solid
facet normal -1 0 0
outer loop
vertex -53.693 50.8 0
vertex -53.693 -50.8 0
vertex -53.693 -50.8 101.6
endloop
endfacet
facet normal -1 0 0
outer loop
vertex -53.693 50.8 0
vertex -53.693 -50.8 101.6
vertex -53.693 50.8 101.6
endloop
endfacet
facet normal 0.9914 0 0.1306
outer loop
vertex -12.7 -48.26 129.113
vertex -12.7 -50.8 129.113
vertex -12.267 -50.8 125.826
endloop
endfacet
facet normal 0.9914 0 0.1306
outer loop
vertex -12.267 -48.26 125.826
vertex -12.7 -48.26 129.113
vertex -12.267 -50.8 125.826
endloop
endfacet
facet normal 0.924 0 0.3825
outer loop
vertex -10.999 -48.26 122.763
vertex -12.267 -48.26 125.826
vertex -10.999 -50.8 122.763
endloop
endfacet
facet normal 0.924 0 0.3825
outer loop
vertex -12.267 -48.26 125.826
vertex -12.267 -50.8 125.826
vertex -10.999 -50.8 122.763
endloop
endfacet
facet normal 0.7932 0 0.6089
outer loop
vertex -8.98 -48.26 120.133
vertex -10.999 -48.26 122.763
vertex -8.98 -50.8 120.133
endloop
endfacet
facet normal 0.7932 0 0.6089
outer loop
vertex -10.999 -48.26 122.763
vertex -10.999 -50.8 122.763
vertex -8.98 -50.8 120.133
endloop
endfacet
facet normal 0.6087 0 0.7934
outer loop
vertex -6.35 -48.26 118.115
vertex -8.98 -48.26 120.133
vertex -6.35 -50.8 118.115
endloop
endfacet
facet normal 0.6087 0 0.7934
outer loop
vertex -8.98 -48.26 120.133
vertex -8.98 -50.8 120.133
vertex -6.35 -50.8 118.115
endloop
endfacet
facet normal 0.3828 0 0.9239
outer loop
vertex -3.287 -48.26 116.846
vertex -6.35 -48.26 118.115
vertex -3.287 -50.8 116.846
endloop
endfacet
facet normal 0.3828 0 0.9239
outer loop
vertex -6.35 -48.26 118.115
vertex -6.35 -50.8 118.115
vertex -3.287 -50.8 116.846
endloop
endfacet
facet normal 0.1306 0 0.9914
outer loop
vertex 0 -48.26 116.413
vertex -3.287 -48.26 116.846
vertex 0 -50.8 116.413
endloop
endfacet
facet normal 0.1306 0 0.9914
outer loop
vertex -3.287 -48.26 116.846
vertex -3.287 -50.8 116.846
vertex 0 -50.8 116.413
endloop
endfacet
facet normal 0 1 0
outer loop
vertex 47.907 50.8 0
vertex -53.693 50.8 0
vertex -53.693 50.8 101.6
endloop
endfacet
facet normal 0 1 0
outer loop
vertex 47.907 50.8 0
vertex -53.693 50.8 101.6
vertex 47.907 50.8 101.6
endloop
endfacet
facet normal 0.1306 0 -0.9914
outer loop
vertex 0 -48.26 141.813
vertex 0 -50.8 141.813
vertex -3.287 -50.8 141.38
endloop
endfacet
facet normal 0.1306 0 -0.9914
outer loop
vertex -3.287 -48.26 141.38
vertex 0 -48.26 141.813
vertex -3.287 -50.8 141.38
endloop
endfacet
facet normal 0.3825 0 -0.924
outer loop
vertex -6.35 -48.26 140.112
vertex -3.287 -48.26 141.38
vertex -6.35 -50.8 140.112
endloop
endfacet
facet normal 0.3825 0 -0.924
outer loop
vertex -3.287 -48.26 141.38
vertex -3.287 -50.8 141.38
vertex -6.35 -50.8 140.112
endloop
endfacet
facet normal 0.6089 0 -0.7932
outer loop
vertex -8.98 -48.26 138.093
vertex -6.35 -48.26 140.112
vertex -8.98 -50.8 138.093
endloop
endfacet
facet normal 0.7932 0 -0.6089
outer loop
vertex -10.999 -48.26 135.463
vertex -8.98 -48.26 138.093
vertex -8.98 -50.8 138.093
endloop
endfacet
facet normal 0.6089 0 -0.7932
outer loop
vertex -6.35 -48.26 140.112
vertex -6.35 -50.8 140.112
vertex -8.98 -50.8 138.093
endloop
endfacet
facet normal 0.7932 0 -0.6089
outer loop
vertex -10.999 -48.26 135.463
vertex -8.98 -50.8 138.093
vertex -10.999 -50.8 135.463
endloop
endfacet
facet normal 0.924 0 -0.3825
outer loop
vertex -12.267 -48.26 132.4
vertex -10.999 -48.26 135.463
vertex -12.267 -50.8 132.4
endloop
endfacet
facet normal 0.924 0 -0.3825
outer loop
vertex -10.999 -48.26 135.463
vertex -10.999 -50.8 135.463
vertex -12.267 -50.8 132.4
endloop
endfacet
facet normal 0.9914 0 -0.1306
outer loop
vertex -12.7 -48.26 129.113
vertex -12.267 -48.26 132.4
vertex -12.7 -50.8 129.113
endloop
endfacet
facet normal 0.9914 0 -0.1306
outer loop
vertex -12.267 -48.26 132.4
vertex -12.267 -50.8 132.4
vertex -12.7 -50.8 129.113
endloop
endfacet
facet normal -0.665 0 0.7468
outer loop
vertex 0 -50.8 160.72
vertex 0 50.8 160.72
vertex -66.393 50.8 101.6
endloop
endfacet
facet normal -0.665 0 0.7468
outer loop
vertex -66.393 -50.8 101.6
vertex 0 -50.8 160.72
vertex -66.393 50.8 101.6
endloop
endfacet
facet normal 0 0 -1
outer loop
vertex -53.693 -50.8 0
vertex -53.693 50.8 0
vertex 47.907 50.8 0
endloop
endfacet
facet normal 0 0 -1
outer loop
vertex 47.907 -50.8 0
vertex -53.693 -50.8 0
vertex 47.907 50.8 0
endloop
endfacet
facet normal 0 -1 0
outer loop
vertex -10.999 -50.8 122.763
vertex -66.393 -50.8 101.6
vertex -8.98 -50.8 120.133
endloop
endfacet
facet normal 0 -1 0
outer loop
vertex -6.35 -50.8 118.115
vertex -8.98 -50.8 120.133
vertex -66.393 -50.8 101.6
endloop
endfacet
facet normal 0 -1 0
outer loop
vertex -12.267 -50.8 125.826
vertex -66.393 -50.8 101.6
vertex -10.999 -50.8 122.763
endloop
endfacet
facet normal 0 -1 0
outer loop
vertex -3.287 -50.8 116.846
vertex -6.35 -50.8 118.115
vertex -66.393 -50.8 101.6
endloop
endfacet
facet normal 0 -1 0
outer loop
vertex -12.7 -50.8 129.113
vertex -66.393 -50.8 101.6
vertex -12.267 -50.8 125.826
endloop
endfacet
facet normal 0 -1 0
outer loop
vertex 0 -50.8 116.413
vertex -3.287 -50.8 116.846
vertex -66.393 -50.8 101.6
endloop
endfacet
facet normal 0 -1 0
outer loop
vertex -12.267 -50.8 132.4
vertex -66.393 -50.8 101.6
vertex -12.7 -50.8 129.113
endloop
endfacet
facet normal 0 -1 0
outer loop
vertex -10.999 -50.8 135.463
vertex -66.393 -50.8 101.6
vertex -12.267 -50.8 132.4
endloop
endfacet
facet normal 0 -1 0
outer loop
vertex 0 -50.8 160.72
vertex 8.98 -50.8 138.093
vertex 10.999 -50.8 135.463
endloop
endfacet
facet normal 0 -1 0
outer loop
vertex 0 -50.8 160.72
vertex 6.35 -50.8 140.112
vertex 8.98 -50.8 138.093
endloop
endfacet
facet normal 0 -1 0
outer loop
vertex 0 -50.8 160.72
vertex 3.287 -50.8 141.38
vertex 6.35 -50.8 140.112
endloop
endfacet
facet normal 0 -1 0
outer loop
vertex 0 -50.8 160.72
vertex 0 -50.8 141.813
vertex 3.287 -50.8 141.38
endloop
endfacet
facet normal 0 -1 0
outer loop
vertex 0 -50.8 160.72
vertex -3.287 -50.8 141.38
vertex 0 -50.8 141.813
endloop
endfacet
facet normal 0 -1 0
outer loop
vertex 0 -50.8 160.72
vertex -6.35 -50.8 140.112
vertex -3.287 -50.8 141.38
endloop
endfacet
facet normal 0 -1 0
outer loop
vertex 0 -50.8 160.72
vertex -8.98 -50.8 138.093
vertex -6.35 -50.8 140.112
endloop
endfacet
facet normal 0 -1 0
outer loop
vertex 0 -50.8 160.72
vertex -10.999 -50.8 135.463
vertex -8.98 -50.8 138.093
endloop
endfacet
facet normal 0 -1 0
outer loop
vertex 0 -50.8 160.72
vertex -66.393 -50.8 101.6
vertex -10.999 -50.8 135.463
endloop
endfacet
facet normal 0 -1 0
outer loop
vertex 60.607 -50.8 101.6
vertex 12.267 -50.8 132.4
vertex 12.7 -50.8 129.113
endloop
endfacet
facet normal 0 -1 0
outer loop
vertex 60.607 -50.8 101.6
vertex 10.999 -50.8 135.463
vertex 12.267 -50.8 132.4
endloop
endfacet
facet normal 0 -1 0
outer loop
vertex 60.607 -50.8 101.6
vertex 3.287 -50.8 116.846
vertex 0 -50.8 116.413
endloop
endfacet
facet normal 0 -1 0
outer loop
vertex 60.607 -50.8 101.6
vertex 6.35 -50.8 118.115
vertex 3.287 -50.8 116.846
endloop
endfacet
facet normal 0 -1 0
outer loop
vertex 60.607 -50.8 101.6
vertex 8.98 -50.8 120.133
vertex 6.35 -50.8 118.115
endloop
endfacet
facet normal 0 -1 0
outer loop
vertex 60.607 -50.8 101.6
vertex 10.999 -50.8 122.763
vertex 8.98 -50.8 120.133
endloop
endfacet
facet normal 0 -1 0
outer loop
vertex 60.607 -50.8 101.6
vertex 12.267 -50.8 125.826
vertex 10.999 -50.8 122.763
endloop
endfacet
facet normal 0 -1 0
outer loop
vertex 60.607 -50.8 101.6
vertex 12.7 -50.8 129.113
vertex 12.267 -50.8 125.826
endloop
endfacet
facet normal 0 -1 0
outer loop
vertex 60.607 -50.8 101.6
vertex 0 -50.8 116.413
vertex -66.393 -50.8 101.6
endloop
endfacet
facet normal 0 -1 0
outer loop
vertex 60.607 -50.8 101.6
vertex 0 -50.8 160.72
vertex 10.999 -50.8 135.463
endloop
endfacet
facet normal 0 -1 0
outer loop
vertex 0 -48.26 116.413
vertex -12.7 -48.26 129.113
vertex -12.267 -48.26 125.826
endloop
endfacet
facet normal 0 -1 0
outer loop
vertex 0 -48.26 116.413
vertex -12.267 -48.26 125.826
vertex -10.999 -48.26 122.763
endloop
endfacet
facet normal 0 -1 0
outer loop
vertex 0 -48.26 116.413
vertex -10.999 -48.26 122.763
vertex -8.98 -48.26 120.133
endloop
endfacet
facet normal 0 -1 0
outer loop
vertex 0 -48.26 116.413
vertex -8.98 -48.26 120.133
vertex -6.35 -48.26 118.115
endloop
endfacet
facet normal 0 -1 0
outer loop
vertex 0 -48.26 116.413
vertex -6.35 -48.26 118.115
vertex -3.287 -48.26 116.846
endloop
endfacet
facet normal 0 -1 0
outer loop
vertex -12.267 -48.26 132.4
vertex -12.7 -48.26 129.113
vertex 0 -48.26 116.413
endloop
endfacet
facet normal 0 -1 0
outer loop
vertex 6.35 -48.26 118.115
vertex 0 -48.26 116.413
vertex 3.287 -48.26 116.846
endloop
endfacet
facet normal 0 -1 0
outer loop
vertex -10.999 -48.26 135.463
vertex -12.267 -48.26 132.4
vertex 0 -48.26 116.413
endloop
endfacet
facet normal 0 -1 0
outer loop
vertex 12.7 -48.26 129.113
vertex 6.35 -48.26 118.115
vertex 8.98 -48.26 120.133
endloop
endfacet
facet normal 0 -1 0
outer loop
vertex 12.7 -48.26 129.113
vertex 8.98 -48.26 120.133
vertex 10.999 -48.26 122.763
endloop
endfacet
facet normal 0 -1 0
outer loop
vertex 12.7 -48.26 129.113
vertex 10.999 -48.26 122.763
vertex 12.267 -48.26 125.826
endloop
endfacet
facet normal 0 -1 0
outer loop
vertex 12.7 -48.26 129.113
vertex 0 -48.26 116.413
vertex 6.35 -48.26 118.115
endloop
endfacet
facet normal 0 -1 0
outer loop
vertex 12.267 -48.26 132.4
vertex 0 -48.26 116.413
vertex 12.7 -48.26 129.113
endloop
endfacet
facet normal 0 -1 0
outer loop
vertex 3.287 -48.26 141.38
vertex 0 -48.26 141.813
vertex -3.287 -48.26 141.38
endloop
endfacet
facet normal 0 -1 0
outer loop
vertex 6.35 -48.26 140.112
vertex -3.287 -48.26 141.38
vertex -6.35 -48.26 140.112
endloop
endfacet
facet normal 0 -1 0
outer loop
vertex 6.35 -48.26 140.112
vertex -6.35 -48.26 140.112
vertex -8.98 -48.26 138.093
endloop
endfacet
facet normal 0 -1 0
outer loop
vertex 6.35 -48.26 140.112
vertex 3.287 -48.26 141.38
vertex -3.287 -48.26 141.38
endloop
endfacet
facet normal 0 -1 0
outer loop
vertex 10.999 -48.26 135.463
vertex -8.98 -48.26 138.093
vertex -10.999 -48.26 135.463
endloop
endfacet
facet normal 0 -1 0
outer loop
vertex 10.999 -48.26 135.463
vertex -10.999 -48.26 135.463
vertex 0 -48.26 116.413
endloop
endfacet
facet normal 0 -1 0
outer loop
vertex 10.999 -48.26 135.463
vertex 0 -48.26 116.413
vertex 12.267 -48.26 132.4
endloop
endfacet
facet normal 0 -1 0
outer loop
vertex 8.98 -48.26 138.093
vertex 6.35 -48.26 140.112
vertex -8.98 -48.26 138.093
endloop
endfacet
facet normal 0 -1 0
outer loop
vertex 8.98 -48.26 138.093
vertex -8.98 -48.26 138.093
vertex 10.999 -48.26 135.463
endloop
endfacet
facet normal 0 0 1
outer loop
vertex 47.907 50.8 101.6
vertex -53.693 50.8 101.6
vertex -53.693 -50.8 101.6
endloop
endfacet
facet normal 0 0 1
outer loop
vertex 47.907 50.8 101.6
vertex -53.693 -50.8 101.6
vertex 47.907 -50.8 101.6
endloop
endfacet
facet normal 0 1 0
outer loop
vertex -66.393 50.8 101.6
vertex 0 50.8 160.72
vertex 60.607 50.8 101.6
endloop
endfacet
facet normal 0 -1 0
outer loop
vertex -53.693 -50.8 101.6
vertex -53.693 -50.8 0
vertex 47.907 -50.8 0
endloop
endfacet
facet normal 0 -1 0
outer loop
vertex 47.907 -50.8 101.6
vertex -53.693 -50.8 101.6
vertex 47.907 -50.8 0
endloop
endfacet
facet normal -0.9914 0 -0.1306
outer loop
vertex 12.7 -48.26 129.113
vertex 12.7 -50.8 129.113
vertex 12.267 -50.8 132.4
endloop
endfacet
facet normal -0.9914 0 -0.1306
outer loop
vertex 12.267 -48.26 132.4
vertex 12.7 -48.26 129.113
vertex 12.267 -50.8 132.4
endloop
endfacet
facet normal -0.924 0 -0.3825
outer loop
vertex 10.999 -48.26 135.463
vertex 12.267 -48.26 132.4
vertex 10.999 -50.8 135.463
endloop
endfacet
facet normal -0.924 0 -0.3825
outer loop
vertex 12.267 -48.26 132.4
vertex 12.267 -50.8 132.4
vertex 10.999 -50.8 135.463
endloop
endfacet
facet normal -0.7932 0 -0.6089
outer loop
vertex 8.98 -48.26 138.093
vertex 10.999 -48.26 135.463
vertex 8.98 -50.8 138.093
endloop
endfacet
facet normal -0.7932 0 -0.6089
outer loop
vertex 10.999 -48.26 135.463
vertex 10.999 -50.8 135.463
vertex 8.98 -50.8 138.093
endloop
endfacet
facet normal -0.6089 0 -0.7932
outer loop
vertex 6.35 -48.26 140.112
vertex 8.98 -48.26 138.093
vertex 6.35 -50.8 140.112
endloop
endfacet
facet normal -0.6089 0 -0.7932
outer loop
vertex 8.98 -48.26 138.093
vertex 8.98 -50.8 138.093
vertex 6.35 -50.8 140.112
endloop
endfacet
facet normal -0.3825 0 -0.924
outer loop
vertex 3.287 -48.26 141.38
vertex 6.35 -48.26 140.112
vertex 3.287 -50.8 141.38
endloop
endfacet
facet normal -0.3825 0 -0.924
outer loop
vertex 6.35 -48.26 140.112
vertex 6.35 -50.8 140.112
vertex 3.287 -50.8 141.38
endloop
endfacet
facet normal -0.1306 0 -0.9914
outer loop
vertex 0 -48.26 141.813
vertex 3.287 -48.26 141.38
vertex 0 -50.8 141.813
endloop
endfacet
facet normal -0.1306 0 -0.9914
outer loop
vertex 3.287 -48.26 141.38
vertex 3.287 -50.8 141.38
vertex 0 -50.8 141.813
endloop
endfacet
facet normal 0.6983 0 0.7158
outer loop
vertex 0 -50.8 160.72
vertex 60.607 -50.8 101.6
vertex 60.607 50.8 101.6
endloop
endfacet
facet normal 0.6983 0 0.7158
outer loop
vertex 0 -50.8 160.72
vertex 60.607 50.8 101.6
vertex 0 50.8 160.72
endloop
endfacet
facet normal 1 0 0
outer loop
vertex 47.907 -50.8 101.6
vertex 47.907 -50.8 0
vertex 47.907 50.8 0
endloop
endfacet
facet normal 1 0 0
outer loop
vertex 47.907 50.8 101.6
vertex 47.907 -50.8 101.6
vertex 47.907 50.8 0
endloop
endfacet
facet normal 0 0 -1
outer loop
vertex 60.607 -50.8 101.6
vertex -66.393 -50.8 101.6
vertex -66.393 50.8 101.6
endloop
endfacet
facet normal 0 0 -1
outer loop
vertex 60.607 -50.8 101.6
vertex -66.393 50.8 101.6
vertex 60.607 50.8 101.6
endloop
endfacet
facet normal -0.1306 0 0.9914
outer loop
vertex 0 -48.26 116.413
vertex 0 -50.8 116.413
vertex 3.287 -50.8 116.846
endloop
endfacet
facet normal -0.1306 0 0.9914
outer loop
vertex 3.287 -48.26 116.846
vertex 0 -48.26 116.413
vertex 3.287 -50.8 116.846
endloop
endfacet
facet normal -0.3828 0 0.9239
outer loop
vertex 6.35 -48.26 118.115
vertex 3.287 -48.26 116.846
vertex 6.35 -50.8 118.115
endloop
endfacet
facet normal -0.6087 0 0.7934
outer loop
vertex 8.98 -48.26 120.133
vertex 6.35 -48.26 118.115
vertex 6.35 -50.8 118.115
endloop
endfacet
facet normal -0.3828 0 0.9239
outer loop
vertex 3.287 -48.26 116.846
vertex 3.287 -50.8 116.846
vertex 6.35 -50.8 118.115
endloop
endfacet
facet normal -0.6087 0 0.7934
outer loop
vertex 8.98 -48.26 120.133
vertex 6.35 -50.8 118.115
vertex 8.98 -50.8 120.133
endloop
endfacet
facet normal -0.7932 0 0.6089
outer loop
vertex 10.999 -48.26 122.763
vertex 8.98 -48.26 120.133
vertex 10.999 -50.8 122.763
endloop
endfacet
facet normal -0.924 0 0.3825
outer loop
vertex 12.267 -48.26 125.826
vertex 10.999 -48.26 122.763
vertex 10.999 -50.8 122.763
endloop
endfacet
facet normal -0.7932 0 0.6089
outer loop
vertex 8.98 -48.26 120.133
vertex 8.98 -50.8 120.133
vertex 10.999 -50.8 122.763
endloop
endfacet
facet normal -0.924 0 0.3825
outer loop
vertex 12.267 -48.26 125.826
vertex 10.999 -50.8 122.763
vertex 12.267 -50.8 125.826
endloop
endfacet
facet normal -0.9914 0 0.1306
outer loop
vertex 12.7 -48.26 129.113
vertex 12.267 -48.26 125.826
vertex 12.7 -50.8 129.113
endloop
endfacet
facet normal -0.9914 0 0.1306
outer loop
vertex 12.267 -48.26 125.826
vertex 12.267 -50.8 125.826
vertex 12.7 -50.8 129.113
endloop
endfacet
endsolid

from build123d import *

# Parameters (mm, degrees)
F0_W     = 101.6
F0_H     = 101.6
F1_DEPTH = 101.6
F3_DEPTH = 101.6
F7_DEPTH = 2.54


with BuildPart() as f1:
    # F0 (on Top) → F1 (new body)
    with BuildSketch(Plane.XY):
        with Locations((-2.8933114175, 0)):
            Rectangle(F0_W, F0_H)
    extrude(amount=F1_DEPTH)


with BuildPart() as f3:
    # F2 (on face) → F3 (new body)
    with BuildSketch(Plane.XZ.offset(50.8)):
        Polygon((0, 186.119693834), (-66.3933114175, 127), (60.6066885825, 127), align=None)
    extrude(amount=-F3_DEPTH)


with BuildPart() as f3_1:
    # F4: moved
    add(f3.part.moved(Location((0, 0, -25.4))))

    # F6 (on face) → F7 (cut)
    with BuildSketch(Plane.XZ.offset(50.8)):
        with BuildLine():
            Line((0, 141.8131968484), (0, 129.1131968484))
            Line((0, 129.1131968484), (12.7, 129.1131968484))
            ThreePointArc((12.7, 129.1131968484), (8.9802561211, 138.0934529694), (0, 141.8131968484))
        make_face()
        with BuildLine():
            Line((-12.7, 129.1131968484), (0, 129.1131968484))
            Line((0, 129.1131968484), (0, 141.8131968484))
            ThreePointArc((0, 141.8131968484), (-8.9802561211, 138.0934529694), (-12.7, 129.1131968484))
        make_face()
        with BuildLine():
            Line((0, 116.4131968484), (0, 129.1131968484))
            Line((0, 129.1131968484), (-12.7, 129.1131968484))
            ThreePointArc((-12.7, 129.1131968484), (-8.9802561211, 120.1329407273), (0, 116.4131968484))
        make_face()
        with BuildLine():
            Line((12.7, 129.1131968484), (0, 129.1131968484))
            Line((0, 129.1131968484), (0, 116.4131968484))
            ThreePointArc((0, 116.4131968484), (8.9802561211, 120.1329407273), (12.7, 129.1131968484))
        make_face()
    extrude(amount=-F7_DEPTH, mode=Mode.SUBTRACT)


solid = Compound([f1.part, f3_1.part])
